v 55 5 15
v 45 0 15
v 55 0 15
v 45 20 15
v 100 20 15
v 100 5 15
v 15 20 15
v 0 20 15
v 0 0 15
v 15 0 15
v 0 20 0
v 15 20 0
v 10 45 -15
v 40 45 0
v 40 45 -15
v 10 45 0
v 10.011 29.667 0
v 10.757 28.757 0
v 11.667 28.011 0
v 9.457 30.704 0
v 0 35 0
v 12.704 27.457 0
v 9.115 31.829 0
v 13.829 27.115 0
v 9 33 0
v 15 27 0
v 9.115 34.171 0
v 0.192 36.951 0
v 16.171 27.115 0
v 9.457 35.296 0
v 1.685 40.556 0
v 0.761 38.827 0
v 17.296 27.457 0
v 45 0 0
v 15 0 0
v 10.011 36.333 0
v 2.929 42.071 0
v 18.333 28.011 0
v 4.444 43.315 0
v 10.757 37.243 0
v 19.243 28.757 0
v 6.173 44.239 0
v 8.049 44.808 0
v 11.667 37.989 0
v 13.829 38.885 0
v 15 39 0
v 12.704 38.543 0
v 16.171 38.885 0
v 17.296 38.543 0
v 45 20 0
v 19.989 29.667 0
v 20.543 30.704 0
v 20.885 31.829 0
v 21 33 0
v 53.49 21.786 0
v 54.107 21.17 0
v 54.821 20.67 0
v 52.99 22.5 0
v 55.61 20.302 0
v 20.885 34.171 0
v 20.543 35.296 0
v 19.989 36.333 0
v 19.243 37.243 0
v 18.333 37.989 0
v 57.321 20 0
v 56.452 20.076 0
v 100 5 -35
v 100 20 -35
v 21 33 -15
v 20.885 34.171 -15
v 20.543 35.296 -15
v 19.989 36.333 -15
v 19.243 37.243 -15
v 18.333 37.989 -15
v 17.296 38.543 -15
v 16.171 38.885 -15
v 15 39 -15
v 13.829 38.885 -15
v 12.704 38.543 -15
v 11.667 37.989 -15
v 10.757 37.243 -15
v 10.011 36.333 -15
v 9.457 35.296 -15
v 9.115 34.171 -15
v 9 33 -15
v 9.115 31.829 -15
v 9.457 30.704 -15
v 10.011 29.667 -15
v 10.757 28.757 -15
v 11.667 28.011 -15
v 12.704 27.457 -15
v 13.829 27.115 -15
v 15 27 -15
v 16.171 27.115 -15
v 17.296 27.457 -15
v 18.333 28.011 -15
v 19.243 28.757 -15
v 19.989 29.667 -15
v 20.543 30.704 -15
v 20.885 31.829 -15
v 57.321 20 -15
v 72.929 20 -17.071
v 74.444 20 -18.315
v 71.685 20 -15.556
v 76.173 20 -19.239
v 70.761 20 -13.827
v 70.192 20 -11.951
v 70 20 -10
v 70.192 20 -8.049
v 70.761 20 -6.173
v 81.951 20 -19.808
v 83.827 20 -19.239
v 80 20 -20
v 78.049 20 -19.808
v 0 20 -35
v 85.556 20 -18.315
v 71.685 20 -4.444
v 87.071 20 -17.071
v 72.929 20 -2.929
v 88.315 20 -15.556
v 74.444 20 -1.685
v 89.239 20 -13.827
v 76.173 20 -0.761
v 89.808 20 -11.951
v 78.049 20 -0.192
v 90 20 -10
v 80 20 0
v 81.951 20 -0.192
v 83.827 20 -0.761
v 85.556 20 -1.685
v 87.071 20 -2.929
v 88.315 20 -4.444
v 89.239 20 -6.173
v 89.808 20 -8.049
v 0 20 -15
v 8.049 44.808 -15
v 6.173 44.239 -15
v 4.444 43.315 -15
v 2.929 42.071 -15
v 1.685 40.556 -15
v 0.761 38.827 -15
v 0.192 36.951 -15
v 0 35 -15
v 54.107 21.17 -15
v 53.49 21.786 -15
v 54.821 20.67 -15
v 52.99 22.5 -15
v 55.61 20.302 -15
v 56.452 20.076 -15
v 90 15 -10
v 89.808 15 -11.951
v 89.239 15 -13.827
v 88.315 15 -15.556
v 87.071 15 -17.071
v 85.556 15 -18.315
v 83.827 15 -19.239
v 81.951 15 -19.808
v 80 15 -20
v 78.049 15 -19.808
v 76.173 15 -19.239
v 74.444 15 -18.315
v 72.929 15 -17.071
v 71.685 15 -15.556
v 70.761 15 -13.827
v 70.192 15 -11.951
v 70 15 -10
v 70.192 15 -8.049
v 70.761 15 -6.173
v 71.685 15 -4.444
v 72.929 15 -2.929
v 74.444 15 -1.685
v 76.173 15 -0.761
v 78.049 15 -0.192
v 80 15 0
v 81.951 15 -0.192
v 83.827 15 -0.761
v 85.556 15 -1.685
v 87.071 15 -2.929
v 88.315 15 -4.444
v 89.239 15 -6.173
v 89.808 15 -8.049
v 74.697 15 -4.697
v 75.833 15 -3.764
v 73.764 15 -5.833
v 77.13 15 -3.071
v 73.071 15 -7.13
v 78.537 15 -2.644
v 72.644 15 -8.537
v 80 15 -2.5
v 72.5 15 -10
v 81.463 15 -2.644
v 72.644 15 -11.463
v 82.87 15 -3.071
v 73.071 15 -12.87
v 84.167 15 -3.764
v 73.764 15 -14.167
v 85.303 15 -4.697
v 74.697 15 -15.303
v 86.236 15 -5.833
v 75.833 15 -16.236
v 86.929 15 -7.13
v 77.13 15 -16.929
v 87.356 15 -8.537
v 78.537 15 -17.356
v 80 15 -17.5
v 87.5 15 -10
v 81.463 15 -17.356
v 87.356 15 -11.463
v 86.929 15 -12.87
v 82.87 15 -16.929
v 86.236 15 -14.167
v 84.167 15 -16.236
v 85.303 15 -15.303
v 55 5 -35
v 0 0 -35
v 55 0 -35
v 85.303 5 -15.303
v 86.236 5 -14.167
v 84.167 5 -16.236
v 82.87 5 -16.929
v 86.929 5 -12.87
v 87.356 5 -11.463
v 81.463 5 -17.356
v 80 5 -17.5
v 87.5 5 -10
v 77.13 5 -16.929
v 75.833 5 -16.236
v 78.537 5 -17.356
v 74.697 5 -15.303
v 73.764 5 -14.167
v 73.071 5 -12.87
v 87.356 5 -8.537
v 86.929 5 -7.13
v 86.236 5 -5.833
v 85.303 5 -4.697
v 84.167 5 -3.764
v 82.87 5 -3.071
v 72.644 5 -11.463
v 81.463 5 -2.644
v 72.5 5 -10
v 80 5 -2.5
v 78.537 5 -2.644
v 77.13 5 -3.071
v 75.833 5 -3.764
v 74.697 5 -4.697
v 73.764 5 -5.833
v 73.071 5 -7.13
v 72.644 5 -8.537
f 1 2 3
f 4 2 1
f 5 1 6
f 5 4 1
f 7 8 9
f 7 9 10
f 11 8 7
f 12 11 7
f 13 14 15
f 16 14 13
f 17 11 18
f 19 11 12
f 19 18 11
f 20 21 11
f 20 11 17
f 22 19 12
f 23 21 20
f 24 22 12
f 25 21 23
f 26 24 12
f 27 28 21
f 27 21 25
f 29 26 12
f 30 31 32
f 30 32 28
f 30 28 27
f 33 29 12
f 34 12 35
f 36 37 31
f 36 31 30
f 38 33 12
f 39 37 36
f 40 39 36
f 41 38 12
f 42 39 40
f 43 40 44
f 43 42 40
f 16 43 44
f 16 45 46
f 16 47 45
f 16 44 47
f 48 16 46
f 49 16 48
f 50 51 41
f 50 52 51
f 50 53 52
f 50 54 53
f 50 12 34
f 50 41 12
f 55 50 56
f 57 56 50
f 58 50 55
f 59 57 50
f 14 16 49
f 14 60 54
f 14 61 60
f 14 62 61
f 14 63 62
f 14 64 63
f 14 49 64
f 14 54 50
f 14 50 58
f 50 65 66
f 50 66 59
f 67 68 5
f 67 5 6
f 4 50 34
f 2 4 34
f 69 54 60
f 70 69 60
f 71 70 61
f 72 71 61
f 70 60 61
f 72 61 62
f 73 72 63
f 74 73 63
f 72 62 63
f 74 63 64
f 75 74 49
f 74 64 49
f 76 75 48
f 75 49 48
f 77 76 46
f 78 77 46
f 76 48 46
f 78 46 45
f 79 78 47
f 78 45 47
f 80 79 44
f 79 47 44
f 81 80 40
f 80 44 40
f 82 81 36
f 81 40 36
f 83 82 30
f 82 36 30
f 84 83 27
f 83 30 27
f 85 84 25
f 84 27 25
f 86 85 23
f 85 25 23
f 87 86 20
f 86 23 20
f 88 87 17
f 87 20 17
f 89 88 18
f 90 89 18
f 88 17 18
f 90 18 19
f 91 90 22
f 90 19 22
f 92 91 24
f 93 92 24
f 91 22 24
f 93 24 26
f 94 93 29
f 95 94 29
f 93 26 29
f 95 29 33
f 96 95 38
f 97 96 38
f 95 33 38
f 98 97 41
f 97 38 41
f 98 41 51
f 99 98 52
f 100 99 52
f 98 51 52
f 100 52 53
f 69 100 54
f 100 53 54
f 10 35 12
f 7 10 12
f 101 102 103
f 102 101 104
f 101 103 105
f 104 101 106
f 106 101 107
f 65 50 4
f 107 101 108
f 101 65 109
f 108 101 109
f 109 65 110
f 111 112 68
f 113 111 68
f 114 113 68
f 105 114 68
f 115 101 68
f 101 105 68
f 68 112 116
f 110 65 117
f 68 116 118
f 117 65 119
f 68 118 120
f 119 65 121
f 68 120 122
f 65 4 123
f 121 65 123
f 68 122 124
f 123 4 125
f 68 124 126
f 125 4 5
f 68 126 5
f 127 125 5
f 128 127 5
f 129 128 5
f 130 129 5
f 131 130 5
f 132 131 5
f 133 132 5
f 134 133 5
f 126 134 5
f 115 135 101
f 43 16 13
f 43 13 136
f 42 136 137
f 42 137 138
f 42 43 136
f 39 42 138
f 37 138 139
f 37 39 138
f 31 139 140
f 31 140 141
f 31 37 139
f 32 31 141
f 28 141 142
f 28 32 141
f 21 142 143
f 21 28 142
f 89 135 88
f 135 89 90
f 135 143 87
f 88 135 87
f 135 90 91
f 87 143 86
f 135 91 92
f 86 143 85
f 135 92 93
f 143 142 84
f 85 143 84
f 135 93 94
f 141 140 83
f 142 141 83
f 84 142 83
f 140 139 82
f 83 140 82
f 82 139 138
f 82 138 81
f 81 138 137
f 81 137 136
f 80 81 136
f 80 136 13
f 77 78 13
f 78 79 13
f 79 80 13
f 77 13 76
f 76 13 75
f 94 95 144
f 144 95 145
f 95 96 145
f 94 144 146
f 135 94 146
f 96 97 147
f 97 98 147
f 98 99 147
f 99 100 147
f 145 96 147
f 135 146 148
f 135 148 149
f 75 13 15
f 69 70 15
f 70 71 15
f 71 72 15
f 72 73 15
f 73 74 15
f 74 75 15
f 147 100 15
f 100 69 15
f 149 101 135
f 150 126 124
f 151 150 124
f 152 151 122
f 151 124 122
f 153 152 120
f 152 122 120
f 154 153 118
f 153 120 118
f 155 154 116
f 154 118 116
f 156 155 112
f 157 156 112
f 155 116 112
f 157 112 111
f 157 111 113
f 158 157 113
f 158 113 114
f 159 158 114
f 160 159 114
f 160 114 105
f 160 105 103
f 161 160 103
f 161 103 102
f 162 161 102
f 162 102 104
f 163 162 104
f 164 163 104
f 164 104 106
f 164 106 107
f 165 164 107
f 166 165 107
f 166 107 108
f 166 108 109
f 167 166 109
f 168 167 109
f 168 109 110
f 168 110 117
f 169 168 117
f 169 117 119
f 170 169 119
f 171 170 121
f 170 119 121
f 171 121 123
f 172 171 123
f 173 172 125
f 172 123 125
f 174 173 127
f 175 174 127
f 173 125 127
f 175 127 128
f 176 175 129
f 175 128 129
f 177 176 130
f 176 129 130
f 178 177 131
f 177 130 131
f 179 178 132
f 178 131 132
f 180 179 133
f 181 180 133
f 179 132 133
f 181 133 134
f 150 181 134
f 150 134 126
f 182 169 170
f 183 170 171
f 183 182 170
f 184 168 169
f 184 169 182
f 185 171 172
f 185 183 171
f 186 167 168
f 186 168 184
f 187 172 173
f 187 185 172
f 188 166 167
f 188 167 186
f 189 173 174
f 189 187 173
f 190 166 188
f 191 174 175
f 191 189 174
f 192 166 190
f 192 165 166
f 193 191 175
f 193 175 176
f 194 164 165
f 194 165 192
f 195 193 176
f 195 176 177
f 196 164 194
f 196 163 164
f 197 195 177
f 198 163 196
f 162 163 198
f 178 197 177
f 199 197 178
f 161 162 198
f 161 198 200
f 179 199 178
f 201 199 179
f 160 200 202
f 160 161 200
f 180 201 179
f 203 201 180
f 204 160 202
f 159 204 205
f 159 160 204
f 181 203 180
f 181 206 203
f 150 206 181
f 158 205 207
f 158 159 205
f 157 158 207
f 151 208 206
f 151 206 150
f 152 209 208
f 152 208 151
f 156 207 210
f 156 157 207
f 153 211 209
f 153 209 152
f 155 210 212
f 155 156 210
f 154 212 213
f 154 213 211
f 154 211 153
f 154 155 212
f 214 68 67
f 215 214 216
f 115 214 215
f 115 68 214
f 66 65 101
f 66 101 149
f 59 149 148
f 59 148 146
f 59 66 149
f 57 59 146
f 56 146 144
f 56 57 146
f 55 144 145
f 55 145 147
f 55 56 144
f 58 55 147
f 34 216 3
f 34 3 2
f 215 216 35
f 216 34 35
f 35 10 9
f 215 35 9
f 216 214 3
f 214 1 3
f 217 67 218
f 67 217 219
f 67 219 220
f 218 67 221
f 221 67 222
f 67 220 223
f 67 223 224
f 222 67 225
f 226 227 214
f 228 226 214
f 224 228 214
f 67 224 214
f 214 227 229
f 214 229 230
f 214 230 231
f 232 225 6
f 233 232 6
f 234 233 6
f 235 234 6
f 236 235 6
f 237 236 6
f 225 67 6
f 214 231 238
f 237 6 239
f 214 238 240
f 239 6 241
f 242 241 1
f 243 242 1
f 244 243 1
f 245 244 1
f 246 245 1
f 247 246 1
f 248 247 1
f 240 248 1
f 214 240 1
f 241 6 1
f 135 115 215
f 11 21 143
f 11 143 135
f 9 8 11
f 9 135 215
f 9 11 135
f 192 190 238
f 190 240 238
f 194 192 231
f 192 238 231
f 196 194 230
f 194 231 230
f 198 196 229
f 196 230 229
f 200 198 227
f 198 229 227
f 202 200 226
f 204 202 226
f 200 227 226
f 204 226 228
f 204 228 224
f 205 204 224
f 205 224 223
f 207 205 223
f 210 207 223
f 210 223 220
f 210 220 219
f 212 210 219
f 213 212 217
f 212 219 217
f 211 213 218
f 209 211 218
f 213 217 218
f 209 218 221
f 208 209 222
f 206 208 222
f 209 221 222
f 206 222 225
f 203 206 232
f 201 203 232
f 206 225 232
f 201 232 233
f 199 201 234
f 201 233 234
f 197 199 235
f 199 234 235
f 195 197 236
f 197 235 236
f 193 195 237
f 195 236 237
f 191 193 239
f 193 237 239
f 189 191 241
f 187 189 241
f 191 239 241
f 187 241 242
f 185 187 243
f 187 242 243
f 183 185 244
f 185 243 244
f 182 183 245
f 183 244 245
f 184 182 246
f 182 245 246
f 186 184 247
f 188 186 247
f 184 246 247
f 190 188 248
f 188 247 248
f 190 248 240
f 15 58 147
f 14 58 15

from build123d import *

# Parameters (mm, degrees)
SKETCH2_W             = 15
SKETCH2_H             = 20
BOSS_EXTRUDE1_DEPTH   = 15
BOSS_EXTRUDE1_2_DEPTH = 15
BOSS_EXTRUDE2_DEPTH   = 35
SKETCH9_R             = 6
BOSS_EXTRUDE6_DEPTH   = 15
HOLE1_D               = 15
HOLE1_DEPTH           = 99.968745116
HOLE1_CBORE_D         = 20
HOLE1_CBORE_DEPTH     = 5


with BuildPart() as part:
    # Sketch2 → Boss-Extrude1 (new body)
    with BuildSketch(Plane.XY):
        with Locations((7.5, 10)):
            Rectangle(SKETCH2_W, SKETCH2_H)
    extrude(amount=BOSS_EXTRUDE1_DEPTH)



with BuildPart() as body_2:
    # Sketch2 → Boss-Extrude1 2 (new body)
    with BuildSketch(Plane.XY):
        Polygon((45, 20), (45, 0), (55, 0), (55, 5), (100, 5), (100, 20), align=None)
    extrude(amount=BOSS_EXTRUDE1_2_DEPTH)


with BuildPart() as part_1:
    add(part.part)

    add(body_2.part)  # Boss-Extrude2 merges body 2
    # Sketch3 → Boss-Extrude2 (add)
    with BuildSketch(Plane.XY):
        Polygon((100, 20), (100, 5), (55, 5), (55, 0), (0, 0), (0, 20), align=None)
    extrude(amount=-BOSS_EXTRUDE2_DEPTH)

    # Sketch9 → Boss-Extrude6 (add)
    with BuildSketch(Plane.XY):
        with BuildLine():
            Line((40, 45), (10, 45))
            ThreePointArc((10, 45), (2.928932188, 42.071067812), (0, 35))
            Line((0, 35), (0, 20))
            Line((0, 20), (57.320508076, 20))
            ThreePointArc((57.320508076, 20), (54.820508076, 20.669872981), (52.990381057, 22.5))
            Line((52.990381057, 22.5), (40, 45))
        make_face()
        with Locations((15, 33)):
            Circle(SKETCH9_R, mode=Mode.SUBTRACT)
    extrude(amount=-BOSS_EXTRUDE6_DEPTH)

    # Hole1
    with Locations(Plane(origin=(0, 20, 0), x_dir=(1, 0, 0), z_dir=(0, 1, 0))):
        with Locations((80, 10)):
            CounterBoreHole(HOLE1_D / 2, HOLE1_CBORE_D / 2, HOLE1_CBORE_DEPTH, depth=HOLE1_DEPTH)


solid = part_1.part
